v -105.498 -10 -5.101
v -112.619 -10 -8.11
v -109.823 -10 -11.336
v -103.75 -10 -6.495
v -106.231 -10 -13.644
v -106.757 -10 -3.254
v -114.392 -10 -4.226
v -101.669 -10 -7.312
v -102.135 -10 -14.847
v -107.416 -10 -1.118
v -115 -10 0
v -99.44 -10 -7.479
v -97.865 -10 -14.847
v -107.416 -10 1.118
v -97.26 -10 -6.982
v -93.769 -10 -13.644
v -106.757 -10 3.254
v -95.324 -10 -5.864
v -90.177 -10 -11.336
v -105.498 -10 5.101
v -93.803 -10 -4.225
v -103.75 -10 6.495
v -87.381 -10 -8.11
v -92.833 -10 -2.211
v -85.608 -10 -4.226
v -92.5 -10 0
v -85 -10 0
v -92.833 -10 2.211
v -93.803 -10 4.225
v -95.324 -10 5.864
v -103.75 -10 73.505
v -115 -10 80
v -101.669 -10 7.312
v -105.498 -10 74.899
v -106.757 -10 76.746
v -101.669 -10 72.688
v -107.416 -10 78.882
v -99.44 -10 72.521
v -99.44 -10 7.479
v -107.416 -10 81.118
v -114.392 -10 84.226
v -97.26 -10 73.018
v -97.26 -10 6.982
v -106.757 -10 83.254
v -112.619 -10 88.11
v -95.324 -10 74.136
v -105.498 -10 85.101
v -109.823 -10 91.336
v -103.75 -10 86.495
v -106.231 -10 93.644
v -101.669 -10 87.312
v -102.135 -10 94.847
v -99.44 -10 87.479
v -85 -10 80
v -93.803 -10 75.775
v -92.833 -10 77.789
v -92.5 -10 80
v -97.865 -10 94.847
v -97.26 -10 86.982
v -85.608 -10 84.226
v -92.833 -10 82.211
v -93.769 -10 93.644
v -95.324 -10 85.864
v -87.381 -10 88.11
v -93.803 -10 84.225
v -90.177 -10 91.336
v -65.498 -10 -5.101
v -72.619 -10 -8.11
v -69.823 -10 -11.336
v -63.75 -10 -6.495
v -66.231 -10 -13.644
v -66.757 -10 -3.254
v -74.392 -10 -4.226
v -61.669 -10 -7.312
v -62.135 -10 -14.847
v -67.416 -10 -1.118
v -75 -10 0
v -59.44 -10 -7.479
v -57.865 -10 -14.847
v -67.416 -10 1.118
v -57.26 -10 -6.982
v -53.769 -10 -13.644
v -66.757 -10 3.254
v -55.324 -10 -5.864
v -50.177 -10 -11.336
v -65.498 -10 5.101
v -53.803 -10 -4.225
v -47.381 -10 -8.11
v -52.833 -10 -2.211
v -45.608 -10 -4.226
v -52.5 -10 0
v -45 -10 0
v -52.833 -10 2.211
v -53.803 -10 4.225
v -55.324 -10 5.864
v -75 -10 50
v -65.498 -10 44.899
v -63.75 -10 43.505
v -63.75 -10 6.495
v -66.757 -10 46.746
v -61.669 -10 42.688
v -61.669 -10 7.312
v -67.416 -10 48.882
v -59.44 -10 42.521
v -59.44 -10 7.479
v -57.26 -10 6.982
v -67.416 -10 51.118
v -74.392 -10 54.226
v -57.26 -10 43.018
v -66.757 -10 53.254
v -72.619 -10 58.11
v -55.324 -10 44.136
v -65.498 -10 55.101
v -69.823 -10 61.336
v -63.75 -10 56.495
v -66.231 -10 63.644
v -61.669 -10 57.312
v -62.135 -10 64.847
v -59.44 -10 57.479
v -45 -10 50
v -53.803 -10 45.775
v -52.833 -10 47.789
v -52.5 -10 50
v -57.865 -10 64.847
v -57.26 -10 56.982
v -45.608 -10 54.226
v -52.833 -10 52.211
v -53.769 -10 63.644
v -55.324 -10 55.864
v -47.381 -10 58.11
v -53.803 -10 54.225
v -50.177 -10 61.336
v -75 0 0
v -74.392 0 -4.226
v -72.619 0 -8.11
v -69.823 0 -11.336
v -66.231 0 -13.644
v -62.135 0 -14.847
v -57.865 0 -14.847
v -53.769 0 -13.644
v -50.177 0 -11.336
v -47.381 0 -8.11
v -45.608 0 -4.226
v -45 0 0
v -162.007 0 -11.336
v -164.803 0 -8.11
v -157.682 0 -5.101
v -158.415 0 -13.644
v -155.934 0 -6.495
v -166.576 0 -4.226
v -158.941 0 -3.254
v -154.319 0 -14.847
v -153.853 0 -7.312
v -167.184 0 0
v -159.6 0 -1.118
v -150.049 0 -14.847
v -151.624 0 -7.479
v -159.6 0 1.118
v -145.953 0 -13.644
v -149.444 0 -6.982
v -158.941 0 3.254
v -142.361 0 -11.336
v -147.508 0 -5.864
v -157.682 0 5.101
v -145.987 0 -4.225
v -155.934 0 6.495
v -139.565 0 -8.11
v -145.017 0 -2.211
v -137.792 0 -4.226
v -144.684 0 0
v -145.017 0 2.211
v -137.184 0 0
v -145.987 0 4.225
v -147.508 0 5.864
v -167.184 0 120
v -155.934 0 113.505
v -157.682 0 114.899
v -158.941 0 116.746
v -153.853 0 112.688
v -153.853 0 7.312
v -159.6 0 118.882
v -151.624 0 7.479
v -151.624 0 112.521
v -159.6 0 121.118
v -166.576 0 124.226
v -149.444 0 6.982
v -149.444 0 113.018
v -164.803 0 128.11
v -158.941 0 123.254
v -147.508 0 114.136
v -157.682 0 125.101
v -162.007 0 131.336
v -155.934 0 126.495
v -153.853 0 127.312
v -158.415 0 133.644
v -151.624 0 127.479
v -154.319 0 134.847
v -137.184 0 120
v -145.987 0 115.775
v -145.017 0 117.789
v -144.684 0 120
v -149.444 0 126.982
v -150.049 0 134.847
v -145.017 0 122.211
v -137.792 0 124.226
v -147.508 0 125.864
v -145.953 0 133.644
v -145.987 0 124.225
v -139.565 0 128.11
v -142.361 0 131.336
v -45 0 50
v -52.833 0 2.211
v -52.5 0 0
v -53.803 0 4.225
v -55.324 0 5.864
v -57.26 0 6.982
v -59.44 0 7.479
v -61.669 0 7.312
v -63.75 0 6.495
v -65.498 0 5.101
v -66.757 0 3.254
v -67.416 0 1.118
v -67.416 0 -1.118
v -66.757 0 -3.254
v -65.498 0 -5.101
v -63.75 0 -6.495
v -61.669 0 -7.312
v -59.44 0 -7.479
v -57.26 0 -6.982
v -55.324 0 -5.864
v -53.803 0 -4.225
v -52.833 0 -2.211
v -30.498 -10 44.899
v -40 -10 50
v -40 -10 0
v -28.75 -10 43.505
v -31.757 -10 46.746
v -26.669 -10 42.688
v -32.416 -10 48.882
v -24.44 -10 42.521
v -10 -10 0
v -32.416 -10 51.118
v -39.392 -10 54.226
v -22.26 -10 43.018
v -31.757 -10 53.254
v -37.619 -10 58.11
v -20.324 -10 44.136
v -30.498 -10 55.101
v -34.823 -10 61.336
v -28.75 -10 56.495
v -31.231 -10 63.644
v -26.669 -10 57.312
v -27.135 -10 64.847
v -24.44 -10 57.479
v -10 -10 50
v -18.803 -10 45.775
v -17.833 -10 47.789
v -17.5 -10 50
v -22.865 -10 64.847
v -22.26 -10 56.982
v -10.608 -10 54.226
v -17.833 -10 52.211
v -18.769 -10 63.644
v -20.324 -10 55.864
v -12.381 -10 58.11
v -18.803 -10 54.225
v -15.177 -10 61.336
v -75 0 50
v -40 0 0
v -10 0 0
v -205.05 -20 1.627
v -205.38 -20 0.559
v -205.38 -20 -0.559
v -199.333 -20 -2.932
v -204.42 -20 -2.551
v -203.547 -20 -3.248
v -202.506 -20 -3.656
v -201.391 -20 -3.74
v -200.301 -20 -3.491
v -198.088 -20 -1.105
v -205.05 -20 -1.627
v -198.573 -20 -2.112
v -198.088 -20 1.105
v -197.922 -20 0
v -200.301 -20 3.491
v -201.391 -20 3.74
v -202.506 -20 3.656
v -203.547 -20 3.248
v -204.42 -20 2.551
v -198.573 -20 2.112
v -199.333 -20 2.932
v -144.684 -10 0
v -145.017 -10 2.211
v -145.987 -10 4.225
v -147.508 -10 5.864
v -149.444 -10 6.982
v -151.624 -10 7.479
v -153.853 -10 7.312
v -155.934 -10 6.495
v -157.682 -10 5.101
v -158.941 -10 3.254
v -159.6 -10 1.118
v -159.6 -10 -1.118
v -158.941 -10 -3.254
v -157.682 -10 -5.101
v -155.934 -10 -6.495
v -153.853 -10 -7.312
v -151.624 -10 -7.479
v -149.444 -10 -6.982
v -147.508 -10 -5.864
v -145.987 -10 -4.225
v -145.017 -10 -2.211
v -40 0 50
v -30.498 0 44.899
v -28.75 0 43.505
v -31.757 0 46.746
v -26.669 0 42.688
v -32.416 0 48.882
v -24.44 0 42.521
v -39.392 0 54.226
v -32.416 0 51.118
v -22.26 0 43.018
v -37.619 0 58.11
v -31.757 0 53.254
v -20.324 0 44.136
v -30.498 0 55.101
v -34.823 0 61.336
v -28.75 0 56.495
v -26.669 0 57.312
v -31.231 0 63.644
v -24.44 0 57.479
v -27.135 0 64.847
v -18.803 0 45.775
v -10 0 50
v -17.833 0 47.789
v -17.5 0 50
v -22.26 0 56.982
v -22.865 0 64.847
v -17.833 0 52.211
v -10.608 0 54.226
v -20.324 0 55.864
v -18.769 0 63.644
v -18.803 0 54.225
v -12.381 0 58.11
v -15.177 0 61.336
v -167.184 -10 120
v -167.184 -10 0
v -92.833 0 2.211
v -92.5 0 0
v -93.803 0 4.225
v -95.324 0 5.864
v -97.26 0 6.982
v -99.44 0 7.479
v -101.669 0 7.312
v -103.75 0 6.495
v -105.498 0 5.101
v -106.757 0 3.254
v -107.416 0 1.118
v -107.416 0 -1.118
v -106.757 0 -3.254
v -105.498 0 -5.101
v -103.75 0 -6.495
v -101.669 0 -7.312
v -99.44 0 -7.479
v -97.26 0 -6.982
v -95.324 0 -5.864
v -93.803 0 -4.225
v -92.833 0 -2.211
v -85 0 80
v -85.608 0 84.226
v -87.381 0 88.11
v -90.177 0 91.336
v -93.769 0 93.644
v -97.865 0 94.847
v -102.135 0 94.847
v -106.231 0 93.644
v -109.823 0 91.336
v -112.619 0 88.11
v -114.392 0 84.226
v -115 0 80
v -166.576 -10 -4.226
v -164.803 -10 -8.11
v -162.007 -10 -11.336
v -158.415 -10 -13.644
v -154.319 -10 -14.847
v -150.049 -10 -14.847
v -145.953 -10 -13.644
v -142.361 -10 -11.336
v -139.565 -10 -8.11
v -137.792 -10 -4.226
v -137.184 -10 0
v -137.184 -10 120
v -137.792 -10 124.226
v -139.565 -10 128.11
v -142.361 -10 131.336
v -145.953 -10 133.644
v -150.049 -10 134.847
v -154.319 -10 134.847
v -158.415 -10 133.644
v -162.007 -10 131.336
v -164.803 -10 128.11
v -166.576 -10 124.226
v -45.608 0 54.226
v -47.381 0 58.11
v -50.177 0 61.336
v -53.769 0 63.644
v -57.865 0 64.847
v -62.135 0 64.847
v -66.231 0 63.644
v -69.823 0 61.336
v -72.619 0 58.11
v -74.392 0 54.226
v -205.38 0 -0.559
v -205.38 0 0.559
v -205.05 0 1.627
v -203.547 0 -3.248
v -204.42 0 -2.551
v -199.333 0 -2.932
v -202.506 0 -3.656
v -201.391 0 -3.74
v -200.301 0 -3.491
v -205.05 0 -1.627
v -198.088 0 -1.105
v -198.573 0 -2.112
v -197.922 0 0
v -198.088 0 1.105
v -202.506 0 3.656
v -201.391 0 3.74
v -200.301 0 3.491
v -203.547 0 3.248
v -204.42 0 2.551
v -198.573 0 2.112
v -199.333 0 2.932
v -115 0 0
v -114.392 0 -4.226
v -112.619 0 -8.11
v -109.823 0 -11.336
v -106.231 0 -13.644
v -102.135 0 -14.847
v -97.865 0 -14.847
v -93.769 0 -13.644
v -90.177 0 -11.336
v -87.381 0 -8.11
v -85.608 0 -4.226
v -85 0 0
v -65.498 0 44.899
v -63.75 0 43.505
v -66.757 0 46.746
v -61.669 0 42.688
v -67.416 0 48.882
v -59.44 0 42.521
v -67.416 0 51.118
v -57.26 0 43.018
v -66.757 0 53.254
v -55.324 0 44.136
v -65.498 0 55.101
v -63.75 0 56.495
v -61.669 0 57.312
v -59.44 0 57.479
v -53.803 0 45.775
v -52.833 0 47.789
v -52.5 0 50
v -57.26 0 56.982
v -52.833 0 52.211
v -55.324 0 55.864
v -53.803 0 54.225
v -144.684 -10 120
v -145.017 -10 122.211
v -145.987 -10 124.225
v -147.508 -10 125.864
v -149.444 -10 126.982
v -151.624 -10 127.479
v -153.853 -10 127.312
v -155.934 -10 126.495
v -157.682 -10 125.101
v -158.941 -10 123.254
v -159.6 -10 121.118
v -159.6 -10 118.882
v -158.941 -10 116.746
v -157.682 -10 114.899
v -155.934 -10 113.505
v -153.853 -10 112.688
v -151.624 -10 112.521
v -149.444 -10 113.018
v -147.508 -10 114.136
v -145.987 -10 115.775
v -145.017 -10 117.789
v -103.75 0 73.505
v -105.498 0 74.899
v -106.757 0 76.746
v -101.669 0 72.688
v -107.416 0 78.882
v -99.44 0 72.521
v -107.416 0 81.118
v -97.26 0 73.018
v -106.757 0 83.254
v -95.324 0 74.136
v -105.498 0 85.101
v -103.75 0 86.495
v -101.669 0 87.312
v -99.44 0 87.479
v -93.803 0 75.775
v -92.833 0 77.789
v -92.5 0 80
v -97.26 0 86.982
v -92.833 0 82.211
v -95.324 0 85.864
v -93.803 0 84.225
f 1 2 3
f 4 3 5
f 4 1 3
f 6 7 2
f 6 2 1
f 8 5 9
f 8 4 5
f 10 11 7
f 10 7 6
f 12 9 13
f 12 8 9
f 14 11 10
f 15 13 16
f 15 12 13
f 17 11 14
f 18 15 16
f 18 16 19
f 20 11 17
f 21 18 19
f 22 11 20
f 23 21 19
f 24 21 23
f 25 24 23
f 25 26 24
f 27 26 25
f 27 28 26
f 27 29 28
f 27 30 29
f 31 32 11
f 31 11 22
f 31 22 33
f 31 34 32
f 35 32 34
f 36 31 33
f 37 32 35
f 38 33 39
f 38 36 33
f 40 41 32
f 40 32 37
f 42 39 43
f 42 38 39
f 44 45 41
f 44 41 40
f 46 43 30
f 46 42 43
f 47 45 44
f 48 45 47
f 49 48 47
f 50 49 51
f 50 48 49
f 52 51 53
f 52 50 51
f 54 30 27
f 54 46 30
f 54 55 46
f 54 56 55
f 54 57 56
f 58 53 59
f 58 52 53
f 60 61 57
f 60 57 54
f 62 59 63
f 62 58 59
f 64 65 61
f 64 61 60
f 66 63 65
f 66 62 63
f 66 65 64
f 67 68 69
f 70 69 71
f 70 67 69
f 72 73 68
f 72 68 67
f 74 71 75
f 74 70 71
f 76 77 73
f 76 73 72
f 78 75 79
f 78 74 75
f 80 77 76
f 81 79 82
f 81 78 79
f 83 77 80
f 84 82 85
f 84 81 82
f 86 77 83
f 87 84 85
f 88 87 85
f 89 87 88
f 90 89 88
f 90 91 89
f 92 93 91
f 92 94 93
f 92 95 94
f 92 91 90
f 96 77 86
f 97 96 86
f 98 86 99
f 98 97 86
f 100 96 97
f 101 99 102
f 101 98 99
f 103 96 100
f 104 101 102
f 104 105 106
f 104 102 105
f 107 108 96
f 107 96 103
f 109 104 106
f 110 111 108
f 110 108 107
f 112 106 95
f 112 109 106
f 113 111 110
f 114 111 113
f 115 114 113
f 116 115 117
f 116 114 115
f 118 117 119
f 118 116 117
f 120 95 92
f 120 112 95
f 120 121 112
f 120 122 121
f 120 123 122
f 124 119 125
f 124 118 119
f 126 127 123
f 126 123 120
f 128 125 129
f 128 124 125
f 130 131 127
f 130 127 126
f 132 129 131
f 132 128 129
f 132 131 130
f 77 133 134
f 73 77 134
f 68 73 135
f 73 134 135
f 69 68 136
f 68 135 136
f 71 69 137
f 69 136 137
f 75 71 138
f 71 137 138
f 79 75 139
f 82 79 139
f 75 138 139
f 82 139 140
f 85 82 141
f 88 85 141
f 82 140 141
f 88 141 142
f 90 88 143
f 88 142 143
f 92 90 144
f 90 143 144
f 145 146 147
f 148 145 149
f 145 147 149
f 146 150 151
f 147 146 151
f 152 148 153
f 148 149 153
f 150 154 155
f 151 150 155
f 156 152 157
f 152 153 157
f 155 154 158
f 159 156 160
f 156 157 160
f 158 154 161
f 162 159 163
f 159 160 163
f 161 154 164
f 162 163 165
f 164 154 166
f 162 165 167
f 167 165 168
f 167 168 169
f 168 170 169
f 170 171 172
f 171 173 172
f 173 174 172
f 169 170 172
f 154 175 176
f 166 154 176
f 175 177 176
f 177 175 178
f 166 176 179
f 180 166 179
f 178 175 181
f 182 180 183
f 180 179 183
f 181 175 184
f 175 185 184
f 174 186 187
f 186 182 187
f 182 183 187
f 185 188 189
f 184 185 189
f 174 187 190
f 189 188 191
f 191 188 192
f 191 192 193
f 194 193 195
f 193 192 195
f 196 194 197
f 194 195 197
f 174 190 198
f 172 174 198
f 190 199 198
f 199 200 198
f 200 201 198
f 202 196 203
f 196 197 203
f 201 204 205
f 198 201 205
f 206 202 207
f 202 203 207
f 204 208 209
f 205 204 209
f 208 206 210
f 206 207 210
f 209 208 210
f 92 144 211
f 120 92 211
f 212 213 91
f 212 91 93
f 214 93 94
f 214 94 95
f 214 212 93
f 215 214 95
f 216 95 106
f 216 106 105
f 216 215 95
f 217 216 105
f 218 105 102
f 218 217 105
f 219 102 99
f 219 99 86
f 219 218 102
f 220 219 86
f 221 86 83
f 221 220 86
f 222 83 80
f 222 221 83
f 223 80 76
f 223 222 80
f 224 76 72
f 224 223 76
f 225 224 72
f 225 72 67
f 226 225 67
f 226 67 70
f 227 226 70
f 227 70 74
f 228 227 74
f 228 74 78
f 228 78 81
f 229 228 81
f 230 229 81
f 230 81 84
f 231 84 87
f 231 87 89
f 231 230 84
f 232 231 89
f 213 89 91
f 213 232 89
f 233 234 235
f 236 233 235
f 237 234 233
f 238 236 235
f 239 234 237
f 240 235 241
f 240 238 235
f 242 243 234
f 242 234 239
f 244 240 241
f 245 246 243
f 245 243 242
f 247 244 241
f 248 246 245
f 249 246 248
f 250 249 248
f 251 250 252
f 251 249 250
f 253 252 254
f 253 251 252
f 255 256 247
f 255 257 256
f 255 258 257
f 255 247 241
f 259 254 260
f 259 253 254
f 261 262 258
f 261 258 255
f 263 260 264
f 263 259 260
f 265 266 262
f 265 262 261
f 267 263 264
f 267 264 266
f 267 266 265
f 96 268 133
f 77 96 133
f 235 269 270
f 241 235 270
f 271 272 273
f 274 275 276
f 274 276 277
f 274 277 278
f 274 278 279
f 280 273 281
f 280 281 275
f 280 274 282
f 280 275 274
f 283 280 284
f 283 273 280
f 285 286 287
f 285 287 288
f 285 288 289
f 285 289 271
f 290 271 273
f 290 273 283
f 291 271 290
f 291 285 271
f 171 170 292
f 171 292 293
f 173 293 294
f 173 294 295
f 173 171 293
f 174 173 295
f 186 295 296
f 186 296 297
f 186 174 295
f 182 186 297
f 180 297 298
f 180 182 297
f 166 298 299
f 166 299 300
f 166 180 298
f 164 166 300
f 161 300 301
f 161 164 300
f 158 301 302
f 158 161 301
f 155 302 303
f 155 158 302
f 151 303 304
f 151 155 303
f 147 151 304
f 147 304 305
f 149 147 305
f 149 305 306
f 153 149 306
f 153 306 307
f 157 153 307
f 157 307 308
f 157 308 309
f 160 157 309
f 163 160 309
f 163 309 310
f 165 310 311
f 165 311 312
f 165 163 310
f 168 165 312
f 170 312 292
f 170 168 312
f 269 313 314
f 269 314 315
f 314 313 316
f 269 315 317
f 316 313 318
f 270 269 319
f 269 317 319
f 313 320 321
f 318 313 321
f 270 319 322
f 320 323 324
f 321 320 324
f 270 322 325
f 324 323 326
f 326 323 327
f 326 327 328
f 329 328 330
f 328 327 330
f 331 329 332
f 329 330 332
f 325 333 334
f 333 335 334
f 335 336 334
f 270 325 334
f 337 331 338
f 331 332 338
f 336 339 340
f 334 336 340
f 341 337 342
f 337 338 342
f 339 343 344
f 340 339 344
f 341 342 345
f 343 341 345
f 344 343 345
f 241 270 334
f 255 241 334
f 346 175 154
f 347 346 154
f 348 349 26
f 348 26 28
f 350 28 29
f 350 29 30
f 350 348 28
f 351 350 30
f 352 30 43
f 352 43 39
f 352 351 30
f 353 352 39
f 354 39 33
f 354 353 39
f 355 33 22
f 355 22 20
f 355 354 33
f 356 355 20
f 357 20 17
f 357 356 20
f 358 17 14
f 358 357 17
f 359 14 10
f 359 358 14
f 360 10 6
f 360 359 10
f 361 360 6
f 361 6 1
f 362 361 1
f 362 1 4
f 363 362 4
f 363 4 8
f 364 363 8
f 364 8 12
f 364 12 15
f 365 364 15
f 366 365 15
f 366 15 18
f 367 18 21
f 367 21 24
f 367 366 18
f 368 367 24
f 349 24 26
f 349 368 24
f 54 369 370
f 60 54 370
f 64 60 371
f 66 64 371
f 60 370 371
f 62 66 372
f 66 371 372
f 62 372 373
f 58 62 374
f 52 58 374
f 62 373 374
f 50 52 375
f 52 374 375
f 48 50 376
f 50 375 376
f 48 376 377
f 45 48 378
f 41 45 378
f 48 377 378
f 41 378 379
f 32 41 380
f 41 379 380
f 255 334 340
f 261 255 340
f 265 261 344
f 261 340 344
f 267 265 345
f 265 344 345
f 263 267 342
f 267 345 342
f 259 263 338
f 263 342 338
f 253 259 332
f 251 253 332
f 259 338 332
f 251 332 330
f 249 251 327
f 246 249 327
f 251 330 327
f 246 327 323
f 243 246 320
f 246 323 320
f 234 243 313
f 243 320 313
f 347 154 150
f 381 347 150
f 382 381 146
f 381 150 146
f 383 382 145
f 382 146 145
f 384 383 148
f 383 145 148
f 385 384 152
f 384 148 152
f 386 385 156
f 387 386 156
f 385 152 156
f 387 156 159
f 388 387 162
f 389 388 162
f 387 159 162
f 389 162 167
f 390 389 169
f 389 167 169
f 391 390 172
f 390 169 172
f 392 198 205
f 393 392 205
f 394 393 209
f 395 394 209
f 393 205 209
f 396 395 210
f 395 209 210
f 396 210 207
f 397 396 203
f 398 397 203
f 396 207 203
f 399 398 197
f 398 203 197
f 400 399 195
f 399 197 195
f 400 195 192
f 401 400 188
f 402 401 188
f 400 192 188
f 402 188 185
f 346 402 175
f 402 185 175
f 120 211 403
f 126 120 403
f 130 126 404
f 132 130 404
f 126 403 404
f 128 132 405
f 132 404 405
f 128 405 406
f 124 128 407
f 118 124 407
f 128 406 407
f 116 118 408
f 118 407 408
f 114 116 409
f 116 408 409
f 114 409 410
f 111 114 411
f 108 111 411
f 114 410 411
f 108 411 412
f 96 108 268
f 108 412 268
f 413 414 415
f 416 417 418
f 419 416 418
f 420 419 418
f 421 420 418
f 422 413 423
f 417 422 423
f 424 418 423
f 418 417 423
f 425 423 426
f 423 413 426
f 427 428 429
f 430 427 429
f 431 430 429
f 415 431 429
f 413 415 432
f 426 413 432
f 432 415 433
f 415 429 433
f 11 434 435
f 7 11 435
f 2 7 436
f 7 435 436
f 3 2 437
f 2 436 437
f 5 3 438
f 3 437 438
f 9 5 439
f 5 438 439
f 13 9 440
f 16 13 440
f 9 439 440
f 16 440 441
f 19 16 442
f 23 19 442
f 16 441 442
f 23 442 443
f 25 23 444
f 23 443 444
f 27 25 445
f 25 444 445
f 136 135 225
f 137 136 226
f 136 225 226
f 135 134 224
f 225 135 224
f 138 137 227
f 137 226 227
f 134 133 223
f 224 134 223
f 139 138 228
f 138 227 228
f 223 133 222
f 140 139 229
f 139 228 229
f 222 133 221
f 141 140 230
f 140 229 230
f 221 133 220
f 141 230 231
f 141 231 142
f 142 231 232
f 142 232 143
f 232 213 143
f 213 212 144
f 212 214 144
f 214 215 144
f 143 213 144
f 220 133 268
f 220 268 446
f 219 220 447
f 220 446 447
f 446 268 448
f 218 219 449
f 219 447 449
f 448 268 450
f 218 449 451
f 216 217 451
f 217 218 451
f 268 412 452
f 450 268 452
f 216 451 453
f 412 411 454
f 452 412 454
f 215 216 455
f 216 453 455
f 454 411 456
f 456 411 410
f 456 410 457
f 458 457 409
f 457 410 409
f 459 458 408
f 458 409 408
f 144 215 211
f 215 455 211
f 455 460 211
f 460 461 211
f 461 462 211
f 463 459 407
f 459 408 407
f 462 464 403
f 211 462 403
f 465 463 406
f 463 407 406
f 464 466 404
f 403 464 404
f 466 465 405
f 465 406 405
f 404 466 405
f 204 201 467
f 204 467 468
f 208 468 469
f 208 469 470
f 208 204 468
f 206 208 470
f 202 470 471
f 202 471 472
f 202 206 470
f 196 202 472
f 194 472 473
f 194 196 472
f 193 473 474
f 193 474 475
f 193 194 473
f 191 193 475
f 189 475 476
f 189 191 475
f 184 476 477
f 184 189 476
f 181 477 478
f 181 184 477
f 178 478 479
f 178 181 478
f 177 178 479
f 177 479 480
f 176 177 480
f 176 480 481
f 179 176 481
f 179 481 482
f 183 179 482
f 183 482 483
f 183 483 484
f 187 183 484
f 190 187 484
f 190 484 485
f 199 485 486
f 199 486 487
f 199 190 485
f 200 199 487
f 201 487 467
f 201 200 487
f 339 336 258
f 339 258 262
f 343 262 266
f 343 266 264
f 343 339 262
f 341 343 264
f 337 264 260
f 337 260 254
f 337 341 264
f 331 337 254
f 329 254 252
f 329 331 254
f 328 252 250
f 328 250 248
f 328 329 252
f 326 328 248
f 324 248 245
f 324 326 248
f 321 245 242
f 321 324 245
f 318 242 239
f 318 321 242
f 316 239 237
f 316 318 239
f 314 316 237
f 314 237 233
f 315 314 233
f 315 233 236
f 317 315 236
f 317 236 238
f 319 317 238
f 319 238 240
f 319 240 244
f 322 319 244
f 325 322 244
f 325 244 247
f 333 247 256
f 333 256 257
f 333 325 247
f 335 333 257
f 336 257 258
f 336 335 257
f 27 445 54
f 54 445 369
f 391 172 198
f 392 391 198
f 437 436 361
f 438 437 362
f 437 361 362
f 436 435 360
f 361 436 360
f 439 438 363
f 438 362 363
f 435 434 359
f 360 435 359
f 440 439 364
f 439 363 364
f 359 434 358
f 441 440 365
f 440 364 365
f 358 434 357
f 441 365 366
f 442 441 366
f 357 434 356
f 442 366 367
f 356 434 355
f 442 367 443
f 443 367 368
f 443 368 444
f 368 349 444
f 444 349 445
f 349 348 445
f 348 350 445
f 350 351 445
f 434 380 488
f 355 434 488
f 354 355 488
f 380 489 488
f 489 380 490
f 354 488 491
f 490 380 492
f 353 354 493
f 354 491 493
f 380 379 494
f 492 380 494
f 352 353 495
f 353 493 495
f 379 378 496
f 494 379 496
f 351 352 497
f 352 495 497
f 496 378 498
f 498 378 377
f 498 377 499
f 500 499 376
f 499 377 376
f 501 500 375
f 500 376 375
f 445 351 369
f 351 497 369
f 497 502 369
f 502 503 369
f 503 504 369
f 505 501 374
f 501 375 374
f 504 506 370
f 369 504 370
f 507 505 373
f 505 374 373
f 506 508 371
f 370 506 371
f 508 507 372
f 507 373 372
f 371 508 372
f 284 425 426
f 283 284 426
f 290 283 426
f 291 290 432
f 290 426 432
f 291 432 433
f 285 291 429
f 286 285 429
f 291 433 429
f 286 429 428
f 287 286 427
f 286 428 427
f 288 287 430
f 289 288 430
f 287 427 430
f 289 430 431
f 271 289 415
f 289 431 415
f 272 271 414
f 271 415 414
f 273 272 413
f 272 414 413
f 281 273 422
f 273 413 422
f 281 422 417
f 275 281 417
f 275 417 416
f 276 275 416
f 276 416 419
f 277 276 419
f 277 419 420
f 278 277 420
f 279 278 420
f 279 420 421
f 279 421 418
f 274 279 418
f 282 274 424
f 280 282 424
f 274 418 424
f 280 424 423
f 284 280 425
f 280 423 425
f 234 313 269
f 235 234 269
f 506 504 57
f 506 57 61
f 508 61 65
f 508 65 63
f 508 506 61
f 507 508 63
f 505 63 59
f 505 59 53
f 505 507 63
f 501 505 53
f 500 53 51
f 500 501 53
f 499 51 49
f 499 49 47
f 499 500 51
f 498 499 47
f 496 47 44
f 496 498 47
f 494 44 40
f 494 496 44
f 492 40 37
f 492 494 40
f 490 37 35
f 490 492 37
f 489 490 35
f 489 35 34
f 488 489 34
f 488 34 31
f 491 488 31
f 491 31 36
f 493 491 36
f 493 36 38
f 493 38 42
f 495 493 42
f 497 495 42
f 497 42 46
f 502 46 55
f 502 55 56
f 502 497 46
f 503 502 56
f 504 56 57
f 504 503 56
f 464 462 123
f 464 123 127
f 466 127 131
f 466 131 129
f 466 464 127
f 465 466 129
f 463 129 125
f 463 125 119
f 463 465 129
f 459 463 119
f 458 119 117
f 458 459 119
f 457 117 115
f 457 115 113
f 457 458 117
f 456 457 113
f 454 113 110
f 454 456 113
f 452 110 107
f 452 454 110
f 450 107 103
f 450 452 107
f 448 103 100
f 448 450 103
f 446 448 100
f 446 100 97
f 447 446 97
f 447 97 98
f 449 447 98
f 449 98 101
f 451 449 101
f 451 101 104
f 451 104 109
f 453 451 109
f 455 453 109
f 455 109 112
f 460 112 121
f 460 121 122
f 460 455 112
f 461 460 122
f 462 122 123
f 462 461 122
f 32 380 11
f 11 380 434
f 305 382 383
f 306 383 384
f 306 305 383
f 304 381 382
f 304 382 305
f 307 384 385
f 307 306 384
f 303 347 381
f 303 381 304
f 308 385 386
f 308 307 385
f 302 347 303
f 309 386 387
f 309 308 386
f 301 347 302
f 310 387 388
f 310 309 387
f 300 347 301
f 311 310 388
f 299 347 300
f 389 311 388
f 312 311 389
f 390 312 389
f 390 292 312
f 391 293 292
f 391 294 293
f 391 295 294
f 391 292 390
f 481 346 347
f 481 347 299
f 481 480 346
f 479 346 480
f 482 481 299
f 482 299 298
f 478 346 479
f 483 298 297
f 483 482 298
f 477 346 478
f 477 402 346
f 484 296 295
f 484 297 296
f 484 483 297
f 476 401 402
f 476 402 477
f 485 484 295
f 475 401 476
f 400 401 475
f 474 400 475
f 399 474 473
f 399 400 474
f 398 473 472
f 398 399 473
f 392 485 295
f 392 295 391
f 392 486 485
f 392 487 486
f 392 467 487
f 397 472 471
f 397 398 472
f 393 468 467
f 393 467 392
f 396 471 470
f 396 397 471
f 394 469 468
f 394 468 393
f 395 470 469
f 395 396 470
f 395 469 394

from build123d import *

# Parameters (mm, degrees)
F1_R      = 7.5
F2_DEPTH  = 10
F3_R      = 7.5
F4_DEPTH  = 10
F5_R      = 7.5
F6_DEPTH  = 10
F7_R      = 7.5
F8_DEPTH  = 10
F9_R      = 3.75
F10_DEPTH = 20


with BuildPart() as f2:
    # F1 (on Front) → F2 (new body)
    with BuildSketch(Plane.XZ):
        with BuildLine():
            ThreePointArc((-40, 50), (-25, 35), (-10, 50))
            ThreePointArc((-10, 50), (-25, 65), (-40, 50))
        make_face()
        with Locations((-25, 50)):
            Circle(F1_R, mode=Mode.SUBTRACT)
        with BuildLine():
            Line((-40, 0), (-10, 0))
            Line((-10, 0), (-10, 50))
            ThreePointArc((-10, 50), (-25, 35), (-40, 50))
            Line((-40, 50), (-40, 0))
        make_face()
    extrude(amount=F2_DEPTH)


with BuildPart() as f4:
    # F3 (on Front) → F4 (new body)
    with BuildSketch(Plane.XZ):
        with BuildLine():
            ThreePointArc((-45, 50), (-60, 65), (-75, 50))
            ThreePointArc((-75, 50), (-60, 35), (-45, 50))
        make_face()
        with Locations((-60, 50)):
            Circle(F3_R, mode=Mode.SUBTRACT)
        with BuildLine():
            Line((-75, 50), (-75, 0))
            ThreePointArc((-75, 0), (-60, 15), (-45, 0))
            Line((-45, 0), (-45, 50))
            ThreePointArc((-45, 50), (-60, 35), (-75, 50))
        make_face()
        with BuildLine():
            ThreePointArc((-45, 0), (-60, 15), (-75, 0))
            ThreePointArc((-75, 0), (-60, -15), (-45, 0))
        make_face()
        with Locations((-60, 0)):
            Circle(F3_R, mode=Mode.SUBTRACT)
    extrude(amount=F4_DEPTH)


with BuildPart() as f6:
    # F5 (on Front) → F6 (new body)
    with BuildSketch(Plane.XZ):
        with BuildLine():
            Line((-115, 80), (-115, 0))
            ThreePointArc((-115, 0), (-100, 15), (-85, 0))
            Line((-85, 0), (-85, 80))
            ThreePointArc((-85, 80), (-100, 65), (-115, 80))
        make_face()
        with BuildLine():
            ThreePointArc((-85, 80), (-100, 95), (-115, 80))
            ThreePointArc((-115, 80), (-100, 65), (-85, 80))
        make_face()
        with Locations((-100, 80)):
            Circle(F5_R, mode=Mode.SUBTRACT)
        with BuildLine():
            ThreePointArc((-85, 0), (-100, 15), (-115, 0))
            ThreePointArc((-115, 0), (-100, -15), (-85, 0))
        make_face()
        with Locations((-100, 0)):
            Circle(F5_R, mode=Mode.SUBTRACT)
    extrude(amount=F6_DEPTH)


with BuildPart() as f8:
    # F7 (on Front) → F8 (new body)
    with BuildSketch(Plane.XZ):
        with BuildLine():
            ThreePointArc((-137.1839883041, 120), (-152.1839883041, 135), (-167.1839883041, 120))
            ThreePointArc((-167.1839883041, 120), (-152.1839883041, 105), (-137.1839883041, 120))
        make_face()
        with Locations((-152.1839883041, 120)):
            Circle(F7_R, mode=Mode.SUBTRACT)
        with BuildLine():
            Line((-167.1839883041, 120), (-167.1839883041, 0))
            ThreePointArc((-167.1839883041, 0), (-152.1839883041, 15), (-137.1839883041, 0))
            Line((-137.1839883041, 0), (-137.1839883041, 120))
            ThreePointArc((-137.1839883041, 120), (-152.1839883041, 105), (-167.1839883041, 120))
        make_face()
        with BuildLine():
            ThreePointArc((-137.1839883041, 0), (-152.1839883041, 15), (-167.1839883041, 0))
            ThreePointArc((-167.1839883041, 0), (-152.1839883041, -15), (-137.1839883041, 0))
        make_face()
        with Locations((-152.1839883041, 0)):
            Circle(F7_R, mode=Mode.SUBTRACT)
    extrude(amount=F8_DEPTH)


with BuildPart() as f10:
    # F9 (on Front) → F10 (new body)
    with BuildSketch(Plane.XZ):
        with Locations((-201.671525836, 0)):
            Circle(F9_R)
    extrude(amount=F10_DEPTH)


solid = Compound([f2.part, f4.part, f6.part, f8.part, f10.part])
